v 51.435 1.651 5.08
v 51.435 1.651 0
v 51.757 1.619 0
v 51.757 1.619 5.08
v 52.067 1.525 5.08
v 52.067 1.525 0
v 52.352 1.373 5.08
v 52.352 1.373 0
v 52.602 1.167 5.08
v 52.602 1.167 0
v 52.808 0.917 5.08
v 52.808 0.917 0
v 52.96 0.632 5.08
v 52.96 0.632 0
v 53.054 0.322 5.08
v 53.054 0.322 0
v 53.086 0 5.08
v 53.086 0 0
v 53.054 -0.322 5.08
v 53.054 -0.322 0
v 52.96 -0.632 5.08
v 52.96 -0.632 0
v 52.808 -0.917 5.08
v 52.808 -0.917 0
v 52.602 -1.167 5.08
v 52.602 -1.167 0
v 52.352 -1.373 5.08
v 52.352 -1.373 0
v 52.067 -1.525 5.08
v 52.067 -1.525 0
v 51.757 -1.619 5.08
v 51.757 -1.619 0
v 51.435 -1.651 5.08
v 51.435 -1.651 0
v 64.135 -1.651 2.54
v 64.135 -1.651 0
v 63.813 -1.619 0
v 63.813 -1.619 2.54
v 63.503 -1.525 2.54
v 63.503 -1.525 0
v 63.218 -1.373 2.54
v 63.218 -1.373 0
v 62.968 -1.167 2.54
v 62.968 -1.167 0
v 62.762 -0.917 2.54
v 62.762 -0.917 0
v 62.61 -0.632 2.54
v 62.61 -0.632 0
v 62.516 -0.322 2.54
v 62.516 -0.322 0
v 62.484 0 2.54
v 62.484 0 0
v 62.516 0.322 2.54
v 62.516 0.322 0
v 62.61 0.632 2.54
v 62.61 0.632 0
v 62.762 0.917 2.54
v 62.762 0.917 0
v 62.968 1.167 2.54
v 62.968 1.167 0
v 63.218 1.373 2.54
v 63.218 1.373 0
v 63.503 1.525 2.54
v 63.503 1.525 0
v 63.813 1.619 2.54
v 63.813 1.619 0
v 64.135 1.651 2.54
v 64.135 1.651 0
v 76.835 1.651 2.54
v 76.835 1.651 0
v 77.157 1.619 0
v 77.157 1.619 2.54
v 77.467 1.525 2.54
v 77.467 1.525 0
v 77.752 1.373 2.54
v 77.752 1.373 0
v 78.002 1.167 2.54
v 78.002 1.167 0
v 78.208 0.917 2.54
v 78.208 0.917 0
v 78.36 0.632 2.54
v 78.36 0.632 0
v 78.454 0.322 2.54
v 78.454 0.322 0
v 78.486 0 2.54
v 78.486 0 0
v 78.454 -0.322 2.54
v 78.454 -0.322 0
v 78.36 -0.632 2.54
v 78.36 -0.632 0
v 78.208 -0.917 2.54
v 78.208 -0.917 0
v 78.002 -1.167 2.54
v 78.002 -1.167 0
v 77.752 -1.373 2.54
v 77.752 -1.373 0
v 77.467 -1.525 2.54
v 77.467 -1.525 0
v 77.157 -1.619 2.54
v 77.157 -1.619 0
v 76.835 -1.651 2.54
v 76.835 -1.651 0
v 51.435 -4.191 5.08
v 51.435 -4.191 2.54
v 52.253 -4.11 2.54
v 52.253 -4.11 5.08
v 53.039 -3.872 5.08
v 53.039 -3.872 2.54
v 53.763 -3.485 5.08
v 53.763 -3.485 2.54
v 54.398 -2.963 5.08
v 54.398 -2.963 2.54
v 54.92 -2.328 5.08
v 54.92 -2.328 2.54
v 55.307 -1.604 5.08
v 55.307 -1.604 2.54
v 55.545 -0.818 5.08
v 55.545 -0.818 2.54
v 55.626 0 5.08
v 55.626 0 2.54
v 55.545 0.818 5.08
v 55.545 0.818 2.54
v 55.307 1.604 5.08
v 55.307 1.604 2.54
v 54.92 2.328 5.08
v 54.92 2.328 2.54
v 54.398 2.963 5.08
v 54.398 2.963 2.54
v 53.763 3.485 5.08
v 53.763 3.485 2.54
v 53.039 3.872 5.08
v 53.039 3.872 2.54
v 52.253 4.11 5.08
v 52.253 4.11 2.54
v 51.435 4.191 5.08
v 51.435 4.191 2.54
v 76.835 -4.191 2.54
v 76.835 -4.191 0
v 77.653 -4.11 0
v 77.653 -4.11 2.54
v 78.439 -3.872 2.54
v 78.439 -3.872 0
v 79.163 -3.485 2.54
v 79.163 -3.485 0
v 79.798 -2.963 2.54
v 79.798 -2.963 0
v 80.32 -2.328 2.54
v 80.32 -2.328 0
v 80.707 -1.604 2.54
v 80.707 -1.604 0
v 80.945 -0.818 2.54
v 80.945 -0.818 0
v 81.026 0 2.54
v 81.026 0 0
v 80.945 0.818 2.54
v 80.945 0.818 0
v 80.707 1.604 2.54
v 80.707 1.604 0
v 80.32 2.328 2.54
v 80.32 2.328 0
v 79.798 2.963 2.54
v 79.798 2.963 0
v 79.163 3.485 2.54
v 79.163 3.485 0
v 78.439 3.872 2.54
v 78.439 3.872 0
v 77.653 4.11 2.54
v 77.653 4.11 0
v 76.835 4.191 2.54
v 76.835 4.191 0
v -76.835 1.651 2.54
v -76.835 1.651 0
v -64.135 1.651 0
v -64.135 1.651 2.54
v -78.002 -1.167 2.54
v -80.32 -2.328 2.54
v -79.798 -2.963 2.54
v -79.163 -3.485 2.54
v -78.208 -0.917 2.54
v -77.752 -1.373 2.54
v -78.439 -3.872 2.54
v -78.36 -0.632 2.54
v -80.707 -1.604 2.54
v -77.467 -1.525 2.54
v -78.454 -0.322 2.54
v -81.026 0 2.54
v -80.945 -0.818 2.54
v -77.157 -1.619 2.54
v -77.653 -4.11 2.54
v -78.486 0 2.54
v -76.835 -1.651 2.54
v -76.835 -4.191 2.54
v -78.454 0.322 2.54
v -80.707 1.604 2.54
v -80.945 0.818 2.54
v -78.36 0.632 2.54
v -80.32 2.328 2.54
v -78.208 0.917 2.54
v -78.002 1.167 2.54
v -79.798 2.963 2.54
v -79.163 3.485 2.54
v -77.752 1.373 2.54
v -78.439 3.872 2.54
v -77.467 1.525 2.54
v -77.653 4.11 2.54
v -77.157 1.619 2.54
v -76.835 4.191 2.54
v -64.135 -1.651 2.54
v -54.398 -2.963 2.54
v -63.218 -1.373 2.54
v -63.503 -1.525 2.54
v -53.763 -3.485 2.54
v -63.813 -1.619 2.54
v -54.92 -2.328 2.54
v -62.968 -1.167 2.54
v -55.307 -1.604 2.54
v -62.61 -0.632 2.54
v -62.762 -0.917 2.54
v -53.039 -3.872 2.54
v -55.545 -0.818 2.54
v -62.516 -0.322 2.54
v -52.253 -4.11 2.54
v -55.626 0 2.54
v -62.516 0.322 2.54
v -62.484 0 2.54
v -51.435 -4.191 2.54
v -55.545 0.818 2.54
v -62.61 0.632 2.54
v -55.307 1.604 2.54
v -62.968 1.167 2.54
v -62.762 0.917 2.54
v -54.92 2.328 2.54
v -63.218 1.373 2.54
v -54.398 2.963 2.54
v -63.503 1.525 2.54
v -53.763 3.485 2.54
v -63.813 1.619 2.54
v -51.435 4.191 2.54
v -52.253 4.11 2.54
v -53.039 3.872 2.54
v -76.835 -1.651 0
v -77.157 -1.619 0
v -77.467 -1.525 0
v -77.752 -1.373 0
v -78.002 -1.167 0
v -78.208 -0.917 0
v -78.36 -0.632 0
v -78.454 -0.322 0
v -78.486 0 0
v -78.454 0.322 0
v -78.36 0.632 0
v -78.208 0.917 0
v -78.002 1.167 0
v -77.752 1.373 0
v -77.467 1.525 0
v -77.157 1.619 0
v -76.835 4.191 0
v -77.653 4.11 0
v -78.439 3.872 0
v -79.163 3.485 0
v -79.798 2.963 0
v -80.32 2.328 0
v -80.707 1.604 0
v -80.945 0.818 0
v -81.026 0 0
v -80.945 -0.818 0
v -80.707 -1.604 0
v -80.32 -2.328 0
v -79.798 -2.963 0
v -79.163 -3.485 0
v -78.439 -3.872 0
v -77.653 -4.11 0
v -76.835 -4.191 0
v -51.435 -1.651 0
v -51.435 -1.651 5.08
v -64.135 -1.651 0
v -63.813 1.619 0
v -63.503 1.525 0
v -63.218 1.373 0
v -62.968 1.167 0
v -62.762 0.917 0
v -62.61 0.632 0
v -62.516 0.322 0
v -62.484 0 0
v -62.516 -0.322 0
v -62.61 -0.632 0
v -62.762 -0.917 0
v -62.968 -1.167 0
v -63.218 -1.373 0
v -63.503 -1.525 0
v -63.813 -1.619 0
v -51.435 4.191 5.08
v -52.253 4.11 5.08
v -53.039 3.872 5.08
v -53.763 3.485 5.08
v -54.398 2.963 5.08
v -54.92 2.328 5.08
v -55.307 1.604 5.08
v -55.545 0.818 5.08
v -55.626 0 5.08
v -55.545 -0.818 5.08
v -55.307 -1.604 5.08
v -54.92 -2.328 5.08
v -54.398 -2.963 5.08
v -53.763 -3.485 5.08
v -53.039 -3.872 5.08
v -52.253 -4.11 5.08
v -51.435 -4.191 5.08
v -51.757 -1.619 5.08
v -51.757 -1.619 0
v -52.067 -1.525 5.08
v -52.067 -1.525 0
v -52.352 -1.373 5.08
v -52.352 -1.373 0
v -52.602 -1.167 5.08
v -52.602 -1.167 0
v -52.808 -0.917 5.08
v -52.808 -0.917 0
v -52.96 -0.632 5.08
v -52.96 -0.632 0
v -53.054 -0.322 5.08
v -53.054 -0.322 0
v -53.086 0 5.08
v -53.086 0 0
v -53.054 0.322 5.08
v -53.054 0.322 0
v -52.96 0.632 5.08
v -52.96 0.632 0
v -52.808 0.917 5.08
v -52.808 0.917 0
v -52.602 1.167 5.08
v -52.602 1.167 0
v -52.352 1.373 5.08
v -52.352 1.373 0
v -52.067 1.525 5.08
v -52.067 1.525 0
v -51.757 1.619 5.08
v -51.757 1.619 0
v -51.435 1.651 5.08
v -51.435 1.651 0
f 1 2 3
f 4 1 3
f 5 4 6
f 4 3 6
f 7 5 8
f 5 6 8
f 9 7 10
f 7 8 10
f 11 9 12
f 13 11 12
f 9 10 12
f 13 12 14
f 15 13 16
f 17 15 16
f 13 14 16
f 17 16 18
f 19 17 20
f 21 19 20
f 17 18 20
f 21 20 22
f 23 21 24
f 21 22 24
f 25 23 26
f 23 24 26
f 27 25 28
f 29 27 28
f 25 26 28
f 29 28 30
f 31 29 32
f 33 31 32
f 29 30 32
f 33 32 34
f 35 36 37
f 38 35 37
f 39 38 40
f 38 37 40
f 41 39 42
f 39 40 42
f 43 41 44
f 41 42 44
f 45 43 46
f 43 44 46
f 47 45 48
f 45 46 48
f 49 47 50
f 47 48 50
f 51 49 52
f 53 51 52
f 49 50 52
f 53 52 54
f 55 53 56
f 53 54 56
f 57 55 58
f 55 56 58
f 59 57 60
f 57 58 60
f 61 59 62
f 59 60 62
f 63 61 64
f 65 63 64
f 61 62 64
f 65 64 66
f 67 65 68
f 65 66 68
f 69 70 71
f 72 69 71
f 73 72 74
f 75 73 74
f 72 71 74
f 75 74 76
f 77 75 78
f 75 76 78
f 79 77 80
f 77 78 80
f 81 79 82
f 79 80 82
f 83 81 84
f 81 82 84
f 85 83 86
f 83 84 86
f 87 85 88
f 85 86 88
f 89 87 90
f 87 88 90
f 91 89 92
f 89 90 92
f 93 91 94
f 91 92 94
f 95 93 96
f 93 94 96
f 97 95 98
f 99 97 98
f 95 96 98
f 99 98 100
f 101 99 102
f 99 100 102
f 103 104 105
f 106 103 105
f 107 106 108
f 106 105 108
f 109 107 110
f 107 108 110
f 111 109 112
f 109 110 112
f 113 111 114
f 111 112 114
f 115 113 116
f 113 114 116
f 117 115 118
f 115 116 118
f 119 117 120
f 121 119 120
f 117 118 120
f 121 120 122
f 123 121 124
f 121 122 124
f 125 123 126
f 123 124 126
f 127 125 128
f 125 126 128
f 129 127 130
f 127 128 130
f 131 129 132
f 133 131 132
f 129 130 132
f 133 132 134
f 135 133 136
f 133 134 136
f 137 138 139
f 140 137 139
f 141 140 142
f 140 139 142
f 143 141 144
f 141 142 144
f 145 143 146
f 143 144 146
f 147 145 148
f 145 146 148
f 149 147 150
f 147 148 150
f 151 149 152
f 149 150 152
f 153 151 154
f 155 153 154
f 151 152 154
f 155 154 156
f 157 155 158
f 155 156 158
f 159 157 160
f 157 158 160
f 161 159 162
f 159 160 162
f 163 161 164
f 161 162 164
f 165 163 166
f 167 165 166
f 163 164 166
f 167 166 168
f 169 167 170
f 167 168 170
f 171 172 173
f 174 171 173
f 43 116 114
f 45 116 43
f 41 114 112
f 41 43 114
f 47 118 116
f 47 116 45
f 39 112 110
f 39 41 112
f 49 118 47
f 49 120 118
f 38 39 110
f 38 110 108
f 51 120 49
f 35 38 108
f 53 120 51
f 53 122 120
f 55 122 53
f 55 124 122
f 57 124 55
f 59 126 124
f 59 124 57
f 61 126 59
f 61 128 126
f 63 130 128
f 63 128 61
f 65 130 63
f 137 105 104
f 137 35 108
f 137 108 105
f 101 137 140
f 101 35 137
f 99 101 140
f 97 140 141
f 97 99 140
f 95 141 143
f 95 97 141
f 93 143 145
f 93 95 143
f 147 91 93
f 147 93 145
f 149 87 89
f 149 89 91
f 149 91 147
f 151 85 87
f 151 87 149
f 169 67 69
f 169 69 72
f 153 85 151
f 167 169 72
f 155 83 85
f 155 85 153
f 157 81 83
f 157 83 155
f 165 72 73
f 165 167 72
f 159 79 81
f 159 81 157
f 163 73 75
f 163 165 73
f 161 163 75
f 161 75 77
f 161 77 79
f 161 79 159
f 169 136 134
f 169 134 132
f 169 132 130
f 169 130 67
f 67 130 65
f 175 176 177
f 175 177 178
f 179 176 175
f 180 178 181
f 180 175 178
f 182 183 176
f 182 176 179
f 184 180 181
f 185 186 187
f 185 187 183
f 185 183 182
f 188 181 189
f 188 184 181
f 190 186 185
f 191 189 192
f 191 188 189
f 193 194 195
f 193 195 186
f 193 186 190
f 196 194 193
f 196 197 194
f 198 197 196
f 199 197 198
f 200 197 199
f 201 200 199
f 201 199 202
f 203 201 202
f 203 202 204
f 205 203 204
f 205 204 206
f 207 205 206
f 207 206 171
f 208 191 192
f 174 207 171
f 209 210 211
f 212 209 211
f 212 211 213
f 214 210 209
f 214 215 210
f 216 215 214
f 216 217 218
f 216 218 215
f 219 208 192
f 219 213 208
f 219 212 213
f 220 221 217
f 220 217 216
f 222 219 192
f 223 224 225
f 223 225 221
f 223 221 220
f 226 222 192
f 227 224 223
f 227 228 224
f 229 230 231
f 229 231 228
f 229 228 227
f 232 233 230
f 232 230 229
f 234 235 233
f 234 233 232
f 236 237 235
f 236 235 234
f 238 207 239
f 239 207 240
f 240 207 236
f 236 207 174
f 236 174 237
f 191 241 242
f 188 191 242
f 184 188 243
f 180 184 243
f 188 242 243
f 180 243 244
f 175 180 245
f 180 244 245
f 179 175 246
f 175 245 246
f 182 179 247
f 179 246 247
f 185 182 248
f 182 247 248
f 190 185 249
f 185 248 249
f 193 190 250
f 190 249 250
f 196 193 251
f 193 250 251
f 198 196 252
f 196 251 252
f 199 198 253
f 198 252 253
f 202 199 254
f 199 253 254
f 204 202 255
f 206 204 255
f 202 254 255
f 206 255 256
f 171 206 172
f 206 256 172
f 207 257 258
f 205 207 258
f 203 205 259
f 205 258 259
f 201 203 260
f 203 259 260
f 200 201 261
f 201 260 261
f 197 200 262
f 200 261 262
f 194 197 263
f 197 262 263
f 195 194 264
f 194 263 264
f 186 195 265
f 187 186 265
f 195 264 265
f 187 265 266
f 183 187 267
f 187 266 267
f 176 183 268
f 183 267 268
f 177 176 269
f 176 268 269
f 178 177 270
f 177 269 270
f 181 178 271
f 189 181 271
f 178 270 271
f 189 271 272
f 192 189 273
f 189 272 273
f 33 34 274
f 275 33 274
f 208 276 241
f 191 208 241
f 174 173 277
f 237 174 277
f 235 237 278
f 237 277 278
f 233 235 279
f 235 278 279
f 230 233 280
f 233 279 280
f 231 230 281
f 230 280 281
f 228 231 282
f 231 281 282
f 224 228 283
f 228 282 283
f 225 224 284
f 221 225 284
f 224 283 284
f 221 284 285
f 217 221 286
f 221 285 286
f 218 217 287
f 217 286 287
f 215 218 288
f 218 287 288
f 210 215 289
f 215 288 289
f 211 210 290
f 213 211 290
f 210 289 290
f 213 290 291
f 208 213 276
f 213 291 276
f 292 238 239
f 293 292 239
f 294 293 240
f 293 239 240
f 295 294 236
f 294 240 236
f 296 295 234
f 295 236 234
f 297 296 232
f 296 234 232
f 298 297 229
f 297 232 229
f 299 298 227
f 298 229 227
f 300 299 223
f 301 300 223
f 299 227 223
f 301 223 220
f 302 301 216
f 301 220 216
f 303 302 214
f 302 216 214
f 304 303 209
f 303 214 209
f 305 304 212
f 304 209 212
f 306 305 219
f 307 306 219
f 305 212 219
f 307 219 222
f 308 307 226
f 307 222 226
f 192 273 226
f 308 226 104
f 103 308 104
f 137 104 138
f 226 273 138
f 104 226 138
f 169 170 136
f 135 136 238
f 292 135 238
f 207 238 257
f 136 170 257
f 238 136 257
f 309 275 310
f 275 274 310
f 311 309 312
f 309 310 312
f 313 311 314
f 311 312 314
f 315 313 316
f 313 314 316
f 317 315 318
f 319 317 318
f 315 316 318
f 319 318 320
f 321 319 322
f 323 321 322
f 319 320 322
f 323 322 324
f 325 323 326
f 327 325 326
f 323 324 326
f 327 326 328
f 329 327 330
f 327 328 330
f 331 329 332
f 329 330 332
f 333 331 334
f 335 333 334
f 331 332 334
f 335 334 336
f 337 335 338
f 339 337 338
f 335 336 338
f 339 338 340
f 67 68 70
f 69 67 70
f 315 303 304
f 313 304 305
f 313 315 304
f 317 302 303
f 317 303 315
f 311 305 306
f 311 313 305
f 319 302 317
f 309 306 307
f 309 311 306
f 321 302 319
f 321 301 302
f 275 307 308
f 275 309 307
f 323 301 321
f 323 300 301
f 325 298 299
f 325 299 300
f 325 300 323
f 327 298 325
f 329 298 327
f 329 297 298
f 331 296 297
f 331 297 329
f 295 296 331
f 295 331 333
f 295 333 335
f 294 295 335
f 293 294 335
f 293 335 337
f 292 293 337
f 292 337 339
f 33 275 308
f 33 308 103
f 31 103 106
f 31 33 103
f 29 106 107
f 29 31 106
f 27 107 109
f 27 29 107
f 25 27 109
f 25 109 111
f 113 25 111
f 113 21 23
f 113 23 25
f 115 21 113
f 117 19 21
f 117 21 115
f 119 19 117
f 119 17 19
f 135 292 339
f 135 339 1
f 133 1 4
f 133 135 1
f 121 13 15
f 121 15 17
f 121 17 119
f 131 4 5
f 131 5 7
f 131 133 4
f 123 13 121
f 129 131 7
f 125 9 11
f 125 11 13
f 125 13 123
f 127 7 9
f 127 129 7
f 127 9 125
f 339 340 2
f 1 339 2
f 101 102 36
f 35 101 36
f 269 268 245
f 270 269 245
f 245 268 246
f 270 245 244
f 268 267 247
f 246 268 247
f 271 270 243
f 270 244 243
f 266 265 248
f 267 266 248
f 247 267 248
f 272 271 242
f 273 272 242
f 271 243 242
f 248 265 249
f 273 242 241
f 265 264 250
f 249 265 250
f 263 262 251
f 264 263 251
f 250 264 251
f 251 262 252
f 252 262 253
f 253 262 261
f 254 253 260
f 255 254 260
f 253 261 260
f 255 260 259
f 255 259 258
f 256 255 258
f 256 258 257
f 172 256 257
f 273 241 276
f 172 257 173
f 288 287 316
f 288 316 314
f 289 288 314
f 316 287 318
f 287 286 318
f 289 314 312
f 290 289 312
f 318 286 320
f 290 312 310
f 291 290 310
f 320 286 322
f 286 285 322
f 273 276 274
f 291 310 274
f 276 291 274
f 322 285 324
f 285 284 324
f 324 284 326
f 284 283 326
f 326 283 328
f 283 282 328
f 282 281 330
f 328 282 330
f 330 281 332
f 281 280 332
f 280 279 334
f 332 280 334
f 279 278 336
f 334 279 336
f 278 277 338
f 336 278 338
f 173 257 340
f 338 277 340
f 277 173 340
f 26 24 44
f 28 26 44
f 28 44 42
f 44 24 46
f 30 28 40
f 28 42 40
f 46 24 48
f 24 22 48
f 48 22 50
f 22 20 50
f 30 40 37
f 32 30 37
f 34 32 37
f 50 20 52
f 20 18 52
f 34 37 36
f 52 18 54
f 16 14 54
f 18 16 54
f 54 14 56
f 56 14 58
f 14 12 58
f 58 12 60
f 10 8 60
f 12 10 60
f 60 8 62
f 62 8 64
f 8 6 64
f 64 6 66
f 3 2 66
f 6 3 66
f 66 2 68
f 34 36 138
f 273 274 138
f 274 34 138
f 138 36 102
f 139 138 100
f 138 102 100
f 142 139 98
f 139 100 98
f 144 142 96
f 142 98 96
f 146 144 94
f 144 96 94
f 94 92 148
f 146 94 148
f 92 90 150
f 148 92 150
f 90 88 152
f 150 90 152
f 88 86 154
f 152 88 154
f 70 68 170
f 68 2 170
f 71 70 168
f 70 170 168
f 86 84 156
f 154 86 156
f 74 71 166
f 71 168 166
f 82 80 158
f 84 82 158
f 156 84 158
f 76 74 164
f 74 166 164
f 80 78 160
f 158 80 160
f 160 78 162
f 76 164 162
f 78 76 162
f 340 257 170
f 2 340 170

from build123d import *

# Parameters (mm, degrees)
F1_DEPTH = 2.54
F3_DEPTH = 2.54


with BuildPart() as f1:
    # F0 (on Top) → F1 (new body)
    with BuildSketch(Plane.XY):
        with BuildLine():
            Line((76.835, 4.191), (-76.835, 4.191))
            ThreePointArc((-76.835, 4.191), (-81.026, 0), (-76.835, -4.191))
            Line((-76.835, -4.191), (76.835, -4.191))
            ThreePointArc((76.835, -4.191), (81.026, 0), (76.835, 4.191))
        make_face()
        with BuildLine():
            ThreePointArc((-76.835, -1.651), (-78.486, 0), (-76.835, 1.651))
            Line((-76.835, 1.651), (-64.135, 1.651))
            ThreePointArc((-64.135, 1.651), (-62.484, 0), (-64.135, -1.651))
            Line((-64.135, -1.651), (-76.835, -1.651))
        make_face(mode=Mode.SUBTRACT)
        with BuildLine():
            Line((51.435, -1.651), (-51.435, -1.651))
            ThreePointArc((-51.435, -1.651), (-53.086, 0), (-51.435, 1.651))
            Line((-51.435, 1.651), (51.435, 1.651))
            ThreePointArc((51.435, 1.651), (53.086, 0), (51.435, -1.651))
        make_face(mode=Mode.SUBTRACT)
        with BuildLine():
            ThreePointArc((76.835, 1.651), (78.486, 0), (76.835, -1.651))
            Line((76.835, -1.651), (64.135, -1.651))
            ThreePointArc((64.135, -1.651), (62.484, 0), (64.135, 1.651))
            Line((64.135, 1.651), (76.835, 1.651))
        make_face(mode=Mode.SUBTRACT)
    extrude(amount=F1_DEPTH)

    # F2 (on face) → F3 (join)
    with BuildSketch(Plane.XY.offset(2.54)):
        with BuildLine():
            Line((51.435, 4.191), (-51.435, 4.191))
            ThreePointArc((-51.435, 4.191), (-55.626, 0), (-51.435, -4.191))
            Line((-51.435, -4.191), (51.435, -4.191))
            ThreePointArc((51.435, -4.191), (55.626, 0), (51.435, 4.191))
        make_face()
        with BuildLine():
            ThreePointArc((-51.435, -1.651), (-53.086, 0), (-51.435, 1.651))
            Line((-51.435, 1.651), (51.435, 1.651))
            ThreePointArc((51.435, 1.651), (53.086, 0), (51.435, -1.651))
            Line((51.435, -1.651), (-51.435, -1.651))
        make_face(mode=Mode.SUBTRACT)
    extrude(amount=F3_DEPTH)


solid = f1.part
